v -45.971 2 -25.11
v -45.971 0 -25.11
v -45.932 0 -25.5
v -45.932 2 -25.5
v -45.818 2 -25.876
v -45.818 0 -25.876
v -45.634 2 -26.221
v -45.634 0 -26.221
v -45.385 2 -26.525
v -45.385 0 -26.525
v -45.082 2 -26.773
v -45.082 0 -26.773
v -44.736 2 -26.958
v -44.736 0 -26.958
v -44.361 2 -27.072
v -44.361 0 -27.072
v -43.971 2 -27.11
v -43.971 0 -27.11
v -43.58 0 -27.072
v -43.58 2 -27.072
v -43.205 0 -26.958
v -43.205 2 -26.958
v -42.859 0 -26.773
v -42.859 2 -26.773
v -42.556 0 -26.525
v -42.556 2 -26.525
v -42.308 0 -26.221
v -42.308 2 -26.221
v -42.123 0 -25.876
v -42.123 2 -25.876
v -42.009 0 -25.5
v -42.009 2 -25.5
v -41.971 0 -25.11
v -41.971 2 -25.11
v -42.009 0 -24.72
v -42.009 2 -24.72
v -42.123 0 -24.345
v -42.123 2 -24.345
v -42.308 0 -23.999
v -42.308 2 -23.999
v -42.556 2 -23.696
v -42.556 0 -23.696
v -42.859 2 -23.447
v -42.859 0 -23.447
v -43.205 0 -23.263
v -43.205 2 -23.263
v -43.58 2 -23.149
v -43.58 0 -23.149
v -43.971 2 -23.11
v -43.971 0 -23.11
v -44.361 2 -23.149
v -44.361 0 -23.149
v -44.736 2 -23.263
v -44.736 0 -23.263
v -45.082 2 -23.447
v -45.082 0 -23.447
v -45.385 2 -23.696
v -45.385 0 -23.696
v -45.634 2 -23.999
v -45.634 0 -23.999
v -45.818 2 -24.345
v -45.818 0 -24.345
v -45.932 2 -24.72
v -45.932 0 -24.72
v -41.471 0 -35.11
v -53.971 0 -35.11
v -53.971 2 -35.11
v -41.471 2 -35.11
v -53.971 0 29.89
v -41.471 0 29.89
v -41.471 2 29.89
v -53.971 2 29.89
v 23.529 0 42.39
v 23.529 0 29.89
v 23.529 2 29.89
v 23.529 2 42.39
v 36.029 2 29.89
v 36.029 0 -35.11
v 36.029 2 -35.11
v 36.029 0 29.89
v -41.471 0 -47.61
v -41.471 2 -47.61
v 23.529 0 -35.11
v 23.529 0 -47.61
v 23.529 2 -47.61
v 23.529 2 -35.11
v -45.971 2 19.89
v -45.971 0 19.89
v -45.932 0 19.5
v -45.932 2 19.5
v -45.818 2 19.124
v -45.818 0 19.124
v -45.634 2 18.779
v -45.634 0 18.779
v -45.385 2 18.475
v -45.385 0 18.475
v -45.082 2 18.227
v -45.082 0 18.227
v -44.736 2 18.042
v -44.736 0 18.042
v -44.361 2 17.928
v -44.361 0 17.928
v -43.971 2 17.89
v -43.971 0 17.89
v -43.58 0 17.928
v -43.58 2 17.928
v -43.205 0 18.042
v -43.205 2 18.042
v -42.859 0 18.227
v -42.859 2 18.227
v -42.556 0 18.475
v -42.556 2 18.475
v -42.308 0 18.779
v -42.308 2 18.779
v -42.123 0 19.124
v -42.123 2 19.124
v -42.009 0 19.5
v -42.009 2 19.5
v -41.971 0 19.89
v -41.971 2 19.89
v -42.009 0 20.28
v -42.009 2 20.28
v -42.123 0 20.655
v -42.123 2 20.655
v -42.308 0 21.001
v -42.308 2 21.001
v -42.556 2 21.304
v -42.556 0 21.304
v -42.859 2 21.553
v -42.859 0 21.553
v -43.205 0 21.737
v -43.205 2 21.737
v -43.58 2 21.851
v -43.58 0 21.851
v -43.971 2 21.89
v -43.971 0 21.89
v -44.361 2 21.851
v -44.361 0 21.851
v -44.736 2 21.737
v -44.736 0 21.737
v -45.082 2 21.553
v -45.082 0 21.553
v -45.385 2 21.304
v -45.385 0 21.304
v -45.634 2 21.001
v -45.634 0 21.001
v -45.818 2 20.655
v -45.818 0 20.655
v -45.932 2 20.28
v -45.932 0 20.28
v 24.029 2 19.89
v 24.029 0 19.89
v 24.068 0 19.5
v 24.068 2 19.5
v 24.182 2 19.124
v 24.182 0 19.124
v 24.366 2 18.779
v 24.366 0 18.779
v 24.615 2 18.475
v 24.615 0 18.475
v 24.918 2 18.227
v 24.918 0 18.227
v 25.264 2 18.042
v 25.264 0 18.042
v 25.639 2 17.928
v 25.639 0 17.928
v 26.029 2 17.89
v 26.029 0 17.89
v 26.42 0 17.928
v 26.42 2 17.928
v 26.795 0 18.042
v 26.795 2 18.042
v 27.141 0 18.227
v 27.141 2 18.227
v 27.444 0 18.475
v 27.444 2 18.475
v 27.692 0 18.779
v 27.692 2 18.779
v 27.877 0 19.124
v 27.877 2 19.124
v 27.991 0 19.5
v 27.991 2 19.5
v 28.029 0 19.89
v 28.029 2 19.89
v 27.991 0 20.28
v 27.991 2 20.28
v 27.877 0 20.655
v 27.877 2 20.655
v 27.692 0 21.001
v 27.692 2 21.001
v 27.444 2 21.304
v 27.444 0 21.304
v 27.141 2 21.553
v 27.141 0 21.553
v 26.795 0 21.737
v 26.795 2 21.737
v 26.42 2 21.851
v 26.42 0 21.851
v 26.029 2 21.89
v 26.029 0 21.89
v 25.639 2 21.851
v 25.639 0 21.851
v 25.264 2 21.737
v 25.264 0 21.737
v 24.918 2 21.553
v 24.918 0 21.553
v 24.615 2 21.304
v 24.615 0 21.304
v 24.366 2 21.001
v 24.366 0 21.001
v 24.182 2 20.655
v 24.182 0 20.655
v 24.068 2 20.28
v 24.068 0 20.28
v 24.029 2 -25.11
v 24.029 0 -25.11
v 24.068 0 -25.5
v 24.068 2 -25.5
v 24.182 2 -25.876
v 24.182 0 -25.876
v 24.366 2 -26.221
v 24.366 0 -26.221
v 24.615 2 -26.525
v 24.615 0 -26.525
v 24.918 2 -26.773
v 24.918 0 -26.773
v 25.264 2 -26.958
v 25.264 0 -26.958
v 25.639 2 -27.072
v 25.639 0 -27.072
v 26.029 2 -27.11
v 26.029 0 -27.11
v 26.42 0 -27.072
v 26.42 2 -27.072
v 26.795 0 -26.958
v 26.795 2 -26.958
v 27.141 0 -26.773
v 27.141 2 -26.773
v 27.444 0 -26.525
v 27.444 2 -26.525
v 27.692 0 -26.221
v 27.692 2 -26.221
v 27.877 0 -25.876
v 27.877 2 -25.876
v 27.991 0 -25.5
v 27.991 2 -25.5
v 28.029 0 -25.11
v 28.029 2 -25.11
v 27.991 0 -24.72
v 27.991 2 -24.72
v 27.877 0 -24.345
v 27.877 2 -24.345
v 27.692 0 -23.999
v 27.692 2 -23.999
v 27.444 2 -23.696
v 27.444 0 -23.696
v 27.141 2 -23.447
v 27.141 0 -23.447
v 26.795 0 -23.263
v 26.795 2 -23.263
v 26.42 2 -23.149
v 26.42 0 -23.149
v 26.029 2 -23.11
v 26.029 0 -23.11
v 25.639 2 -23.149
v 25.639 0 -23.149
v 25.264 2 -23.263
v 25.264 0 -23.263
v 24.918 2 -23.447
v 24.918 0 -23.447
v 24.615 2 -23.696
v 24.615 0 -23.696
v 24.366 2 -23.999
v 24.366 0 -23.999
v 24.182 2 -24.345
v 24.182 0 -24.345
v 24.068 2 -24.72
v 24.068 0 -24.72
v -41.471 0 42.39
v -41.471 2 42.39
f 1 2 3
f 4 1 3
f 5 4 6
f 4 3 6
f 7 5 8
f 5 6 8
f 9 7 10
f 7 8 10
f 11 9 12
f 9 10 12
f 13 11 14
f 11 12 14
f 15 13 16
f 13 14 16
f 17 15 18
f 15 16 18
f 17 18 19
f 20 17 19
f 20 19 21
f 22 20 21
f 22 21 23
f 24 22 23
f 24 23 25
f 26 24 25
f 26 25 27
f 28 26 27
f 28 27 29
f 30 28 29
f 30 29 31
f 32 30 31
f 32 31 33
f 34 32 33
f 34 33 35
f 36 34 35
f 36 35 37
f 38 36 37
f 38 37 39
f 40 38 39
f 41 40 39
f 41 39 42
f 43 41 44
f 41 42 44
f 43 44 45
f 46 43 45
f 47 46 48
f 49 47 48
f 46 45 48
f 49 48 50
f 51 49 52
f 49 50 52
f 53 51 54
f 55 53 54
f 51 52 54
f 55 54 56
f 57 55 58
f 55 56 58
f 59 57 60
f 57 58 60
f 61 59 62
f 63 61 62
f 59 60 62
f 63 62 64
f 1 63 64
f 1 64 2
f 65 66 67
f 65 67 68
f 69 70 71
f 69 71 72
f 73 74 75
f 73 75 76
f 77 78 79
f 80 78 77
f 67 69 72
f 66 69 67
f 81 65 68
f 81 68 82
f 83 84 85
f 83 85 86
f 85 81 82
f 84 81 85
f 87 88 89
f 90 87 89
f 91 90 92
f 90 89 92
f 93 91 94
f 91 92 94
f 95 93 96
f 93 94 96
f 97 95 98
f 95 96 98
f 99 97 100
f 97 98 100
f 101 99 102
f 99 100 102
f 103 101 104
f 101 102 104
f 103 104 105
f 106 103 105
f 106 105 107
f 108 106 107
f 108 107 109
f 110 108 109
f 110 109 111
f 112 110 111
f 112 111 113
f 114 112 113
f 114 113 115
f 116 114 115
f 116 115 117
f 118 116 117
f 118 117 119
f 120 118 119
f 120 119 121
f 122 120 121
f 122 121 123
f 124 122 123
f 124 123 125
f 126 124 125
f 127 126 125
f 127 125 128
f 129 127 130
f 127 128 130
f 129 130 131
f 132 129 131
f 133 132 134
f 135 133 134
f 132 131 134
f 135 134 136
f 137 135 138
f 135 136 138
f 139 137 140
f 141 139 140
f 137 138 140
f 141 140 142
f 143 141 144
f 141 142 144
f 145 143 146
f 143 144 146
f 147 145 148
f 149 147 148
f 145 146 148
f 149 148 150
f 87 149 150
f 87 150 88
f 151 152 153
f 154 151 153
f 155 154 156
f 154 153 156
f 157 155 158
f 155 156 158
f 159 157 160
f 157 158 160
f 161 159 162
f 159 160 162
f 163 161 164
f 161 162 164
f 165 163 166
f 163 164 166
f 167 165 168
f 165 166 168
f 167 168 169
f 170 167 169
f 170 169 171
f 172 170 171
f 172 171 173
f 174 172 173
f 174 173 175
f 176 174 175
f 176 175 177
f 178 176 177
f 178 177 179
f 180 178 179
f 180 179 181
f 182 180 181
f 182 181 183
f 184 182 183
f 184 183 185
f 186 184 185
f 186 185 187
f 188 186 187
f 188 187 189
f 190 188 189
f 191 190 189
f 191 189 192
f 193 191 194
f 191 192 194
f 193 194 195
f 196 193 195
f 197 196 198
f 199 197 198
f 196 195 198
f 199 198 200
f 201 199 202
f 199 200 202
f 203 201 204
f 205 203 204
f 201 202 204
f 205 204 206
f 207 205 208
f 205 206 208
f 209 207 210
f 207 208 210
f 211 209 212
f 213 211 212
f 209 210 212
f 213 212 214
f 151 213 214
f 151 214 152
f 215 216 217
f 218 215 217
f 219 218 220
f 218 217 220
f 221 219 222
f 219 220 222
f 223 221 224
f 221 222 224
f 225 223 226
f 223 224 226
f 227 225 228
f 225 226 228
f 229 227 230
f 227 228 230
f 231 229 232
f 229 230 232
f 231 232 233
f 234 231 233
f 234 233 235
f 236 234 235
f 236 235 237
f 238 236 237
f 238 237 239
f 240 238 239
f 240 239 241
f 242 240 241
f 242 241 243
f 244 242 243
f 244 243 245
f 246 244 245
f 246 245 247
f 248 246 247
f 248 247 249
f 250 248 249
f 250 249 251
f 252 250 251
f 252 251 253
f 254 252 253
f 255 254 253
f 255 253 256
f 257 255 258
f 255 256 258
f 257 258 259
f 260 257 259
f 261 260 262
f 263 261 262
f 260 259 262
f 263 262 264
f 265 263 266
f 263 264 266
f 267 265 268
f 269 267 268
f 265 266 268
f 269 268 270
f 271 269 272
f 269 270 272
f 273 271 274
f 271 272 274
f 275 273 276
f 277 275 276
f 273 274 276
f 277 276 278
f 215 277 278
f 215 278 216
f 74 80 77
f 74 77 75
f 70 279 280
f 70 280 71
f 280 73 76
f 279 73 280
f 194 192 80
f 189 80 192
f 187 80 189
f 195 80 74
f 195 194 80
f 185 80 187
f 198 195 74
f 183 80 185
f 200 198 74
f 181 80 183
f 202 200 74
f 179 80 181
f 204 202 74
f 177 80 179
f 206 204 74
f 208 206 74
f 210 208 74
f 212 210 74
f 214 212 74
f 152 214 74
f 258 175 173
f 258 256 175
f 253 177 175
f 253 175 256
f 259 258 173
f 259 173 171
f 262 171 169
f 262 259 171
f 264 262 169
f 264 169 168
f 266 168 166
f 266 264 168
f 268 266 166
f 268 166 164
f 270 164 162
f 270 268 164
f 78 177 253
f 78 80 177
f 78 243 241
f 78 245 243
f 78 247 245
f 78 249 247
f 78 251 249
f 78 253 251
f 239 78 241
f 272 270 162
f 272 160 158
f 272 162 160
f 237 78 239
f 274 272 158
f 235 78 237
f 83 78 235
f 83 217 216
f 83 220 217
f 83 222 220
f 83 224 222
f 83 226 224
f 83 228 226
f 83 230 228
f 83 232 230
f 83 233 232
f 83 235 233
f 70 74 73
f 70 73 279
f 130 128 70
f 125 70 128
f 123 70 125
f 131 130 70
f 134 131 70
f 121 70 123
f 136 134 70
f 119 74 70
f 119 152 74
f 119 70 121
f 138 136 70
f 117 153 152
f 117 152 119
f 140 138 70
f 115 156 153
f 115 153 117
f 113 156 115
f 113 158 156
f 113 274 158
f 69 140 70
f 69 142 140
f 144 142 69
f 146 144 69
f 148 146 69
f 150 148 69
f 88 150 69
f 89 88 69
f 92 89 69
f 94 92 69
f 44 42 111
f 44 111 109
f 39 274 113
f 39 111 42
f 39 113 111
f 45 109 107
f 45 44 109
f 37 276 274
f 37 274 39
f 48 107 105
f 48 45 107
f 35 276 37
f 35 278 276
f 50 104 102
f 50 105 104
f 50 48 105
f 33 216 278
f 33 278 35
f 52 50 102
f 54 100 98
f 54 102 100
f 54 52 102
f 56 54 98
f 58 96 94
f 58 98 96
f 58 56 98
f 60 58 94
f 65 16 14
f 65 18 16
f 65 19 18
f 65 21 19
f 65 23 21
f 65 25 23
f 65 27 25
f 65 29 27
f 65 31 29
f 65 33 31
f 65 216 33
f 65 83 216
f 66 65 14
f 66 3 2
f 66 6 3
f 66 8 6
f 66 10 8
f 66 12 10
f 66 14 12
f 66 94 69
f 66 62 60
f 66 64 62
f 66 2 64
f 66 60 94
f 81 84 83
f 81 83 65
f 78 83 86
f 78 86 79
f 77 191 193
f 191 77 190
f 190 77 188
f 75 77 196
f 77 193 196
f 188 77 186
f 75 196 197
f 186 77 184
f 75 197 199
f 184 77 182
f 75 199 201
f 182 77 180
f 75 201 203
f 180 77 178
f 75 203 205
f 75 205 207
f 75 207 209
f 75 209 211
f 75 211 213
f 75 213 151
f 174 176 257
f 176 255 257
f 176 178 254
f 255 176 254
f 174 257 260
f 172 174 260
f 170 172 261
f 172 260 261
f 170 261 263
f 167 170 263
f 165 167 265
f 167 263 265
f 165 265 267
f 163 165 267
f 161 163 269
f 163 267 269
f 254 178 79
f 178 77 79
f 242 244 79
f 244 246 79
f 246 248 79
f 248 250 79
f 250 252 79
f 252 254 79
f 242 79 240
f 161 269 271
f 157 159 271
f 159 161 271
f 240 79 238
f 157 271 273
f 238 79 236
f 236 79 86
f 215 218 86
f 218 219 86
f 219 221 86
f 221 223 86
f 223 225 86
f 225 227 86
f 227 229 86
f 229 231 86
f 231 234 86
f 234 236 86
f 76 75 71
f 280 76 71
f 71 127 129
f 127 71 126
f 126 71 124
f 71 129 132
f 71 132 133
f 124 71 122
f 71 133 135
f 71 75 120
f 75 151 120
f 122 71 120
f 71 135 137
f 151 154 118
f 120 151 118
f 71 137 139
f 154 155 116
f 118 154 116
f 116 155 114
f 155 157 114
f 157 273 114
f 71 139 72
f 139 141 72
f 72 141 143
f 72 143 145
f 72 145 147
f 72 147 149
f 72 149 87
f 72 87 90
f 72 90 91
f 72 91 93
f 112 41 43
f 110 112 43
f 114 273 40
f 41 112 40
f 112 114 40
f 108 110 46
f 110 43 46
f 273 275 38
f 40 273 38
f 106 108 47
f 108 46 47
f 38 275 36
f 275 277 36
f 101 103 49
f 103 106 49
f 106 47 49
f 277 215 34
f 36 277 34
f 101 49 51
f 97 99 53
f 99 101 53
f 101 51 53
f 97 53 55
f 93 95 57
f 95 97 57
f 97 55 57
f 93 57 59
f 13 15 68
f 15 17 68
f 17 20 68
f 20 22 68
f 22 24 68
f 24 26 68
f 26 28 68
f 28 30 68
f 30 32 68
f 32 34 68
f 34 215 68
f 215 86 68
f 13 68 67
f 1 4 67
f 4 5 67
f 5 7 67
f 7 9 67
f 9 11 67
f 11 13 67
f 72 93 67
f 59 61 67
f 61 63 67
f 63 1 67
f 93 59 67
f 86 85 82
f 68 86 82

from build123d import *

# Parameters (mm, degrees)
BOSS_EXTRUDE1_DEPTH   = 2
F_4_0MM_DOWEL_HOLE1_D = 4


with BuildPart() as part:
    # Sketch1 → Boss-Extrude1 (new body)
    with BuildSketch(Plane(origin=(0, 0, 0), x_dir=(1, 0, 0), z_dir=(0, 1, 0))):
        Polygon((-53.970588235, 35.110294118), (-41.470588235, 35.110294118), (-41.470588235, 47.610294118), (23.529411765, 47.610294118), (23.529411765, 35.110294118), (36.029411765, 35.110294118), (36.029411765, -29.889705882), (23.529411765, -29.889705882), (23.529411765, -42.389705882), (-41.470588235, -42.389705882), (-41.470588235, -29.889705882), (-53.970588235, -29.889705882), align=None)
    extrude(amount=BOSS_EXTRUDE1_DEPTH)

    # Ø4.0mm Dowel Hole1 (through all)
    with Locations(Plane(origin=(0, 2, 0), x_dir=(1, 0, 0), z_dir=(0, 1, 0))):
        with Locations((-43.970588235, 25.110294118), (26.029411765, 25.110294118), (-43.970588235, -19.889705882), (26.029411765, -19.889705882)):
            Hole(F_4_0MM_DOWEL_HOLE1_D / 2)


solid = part.part
